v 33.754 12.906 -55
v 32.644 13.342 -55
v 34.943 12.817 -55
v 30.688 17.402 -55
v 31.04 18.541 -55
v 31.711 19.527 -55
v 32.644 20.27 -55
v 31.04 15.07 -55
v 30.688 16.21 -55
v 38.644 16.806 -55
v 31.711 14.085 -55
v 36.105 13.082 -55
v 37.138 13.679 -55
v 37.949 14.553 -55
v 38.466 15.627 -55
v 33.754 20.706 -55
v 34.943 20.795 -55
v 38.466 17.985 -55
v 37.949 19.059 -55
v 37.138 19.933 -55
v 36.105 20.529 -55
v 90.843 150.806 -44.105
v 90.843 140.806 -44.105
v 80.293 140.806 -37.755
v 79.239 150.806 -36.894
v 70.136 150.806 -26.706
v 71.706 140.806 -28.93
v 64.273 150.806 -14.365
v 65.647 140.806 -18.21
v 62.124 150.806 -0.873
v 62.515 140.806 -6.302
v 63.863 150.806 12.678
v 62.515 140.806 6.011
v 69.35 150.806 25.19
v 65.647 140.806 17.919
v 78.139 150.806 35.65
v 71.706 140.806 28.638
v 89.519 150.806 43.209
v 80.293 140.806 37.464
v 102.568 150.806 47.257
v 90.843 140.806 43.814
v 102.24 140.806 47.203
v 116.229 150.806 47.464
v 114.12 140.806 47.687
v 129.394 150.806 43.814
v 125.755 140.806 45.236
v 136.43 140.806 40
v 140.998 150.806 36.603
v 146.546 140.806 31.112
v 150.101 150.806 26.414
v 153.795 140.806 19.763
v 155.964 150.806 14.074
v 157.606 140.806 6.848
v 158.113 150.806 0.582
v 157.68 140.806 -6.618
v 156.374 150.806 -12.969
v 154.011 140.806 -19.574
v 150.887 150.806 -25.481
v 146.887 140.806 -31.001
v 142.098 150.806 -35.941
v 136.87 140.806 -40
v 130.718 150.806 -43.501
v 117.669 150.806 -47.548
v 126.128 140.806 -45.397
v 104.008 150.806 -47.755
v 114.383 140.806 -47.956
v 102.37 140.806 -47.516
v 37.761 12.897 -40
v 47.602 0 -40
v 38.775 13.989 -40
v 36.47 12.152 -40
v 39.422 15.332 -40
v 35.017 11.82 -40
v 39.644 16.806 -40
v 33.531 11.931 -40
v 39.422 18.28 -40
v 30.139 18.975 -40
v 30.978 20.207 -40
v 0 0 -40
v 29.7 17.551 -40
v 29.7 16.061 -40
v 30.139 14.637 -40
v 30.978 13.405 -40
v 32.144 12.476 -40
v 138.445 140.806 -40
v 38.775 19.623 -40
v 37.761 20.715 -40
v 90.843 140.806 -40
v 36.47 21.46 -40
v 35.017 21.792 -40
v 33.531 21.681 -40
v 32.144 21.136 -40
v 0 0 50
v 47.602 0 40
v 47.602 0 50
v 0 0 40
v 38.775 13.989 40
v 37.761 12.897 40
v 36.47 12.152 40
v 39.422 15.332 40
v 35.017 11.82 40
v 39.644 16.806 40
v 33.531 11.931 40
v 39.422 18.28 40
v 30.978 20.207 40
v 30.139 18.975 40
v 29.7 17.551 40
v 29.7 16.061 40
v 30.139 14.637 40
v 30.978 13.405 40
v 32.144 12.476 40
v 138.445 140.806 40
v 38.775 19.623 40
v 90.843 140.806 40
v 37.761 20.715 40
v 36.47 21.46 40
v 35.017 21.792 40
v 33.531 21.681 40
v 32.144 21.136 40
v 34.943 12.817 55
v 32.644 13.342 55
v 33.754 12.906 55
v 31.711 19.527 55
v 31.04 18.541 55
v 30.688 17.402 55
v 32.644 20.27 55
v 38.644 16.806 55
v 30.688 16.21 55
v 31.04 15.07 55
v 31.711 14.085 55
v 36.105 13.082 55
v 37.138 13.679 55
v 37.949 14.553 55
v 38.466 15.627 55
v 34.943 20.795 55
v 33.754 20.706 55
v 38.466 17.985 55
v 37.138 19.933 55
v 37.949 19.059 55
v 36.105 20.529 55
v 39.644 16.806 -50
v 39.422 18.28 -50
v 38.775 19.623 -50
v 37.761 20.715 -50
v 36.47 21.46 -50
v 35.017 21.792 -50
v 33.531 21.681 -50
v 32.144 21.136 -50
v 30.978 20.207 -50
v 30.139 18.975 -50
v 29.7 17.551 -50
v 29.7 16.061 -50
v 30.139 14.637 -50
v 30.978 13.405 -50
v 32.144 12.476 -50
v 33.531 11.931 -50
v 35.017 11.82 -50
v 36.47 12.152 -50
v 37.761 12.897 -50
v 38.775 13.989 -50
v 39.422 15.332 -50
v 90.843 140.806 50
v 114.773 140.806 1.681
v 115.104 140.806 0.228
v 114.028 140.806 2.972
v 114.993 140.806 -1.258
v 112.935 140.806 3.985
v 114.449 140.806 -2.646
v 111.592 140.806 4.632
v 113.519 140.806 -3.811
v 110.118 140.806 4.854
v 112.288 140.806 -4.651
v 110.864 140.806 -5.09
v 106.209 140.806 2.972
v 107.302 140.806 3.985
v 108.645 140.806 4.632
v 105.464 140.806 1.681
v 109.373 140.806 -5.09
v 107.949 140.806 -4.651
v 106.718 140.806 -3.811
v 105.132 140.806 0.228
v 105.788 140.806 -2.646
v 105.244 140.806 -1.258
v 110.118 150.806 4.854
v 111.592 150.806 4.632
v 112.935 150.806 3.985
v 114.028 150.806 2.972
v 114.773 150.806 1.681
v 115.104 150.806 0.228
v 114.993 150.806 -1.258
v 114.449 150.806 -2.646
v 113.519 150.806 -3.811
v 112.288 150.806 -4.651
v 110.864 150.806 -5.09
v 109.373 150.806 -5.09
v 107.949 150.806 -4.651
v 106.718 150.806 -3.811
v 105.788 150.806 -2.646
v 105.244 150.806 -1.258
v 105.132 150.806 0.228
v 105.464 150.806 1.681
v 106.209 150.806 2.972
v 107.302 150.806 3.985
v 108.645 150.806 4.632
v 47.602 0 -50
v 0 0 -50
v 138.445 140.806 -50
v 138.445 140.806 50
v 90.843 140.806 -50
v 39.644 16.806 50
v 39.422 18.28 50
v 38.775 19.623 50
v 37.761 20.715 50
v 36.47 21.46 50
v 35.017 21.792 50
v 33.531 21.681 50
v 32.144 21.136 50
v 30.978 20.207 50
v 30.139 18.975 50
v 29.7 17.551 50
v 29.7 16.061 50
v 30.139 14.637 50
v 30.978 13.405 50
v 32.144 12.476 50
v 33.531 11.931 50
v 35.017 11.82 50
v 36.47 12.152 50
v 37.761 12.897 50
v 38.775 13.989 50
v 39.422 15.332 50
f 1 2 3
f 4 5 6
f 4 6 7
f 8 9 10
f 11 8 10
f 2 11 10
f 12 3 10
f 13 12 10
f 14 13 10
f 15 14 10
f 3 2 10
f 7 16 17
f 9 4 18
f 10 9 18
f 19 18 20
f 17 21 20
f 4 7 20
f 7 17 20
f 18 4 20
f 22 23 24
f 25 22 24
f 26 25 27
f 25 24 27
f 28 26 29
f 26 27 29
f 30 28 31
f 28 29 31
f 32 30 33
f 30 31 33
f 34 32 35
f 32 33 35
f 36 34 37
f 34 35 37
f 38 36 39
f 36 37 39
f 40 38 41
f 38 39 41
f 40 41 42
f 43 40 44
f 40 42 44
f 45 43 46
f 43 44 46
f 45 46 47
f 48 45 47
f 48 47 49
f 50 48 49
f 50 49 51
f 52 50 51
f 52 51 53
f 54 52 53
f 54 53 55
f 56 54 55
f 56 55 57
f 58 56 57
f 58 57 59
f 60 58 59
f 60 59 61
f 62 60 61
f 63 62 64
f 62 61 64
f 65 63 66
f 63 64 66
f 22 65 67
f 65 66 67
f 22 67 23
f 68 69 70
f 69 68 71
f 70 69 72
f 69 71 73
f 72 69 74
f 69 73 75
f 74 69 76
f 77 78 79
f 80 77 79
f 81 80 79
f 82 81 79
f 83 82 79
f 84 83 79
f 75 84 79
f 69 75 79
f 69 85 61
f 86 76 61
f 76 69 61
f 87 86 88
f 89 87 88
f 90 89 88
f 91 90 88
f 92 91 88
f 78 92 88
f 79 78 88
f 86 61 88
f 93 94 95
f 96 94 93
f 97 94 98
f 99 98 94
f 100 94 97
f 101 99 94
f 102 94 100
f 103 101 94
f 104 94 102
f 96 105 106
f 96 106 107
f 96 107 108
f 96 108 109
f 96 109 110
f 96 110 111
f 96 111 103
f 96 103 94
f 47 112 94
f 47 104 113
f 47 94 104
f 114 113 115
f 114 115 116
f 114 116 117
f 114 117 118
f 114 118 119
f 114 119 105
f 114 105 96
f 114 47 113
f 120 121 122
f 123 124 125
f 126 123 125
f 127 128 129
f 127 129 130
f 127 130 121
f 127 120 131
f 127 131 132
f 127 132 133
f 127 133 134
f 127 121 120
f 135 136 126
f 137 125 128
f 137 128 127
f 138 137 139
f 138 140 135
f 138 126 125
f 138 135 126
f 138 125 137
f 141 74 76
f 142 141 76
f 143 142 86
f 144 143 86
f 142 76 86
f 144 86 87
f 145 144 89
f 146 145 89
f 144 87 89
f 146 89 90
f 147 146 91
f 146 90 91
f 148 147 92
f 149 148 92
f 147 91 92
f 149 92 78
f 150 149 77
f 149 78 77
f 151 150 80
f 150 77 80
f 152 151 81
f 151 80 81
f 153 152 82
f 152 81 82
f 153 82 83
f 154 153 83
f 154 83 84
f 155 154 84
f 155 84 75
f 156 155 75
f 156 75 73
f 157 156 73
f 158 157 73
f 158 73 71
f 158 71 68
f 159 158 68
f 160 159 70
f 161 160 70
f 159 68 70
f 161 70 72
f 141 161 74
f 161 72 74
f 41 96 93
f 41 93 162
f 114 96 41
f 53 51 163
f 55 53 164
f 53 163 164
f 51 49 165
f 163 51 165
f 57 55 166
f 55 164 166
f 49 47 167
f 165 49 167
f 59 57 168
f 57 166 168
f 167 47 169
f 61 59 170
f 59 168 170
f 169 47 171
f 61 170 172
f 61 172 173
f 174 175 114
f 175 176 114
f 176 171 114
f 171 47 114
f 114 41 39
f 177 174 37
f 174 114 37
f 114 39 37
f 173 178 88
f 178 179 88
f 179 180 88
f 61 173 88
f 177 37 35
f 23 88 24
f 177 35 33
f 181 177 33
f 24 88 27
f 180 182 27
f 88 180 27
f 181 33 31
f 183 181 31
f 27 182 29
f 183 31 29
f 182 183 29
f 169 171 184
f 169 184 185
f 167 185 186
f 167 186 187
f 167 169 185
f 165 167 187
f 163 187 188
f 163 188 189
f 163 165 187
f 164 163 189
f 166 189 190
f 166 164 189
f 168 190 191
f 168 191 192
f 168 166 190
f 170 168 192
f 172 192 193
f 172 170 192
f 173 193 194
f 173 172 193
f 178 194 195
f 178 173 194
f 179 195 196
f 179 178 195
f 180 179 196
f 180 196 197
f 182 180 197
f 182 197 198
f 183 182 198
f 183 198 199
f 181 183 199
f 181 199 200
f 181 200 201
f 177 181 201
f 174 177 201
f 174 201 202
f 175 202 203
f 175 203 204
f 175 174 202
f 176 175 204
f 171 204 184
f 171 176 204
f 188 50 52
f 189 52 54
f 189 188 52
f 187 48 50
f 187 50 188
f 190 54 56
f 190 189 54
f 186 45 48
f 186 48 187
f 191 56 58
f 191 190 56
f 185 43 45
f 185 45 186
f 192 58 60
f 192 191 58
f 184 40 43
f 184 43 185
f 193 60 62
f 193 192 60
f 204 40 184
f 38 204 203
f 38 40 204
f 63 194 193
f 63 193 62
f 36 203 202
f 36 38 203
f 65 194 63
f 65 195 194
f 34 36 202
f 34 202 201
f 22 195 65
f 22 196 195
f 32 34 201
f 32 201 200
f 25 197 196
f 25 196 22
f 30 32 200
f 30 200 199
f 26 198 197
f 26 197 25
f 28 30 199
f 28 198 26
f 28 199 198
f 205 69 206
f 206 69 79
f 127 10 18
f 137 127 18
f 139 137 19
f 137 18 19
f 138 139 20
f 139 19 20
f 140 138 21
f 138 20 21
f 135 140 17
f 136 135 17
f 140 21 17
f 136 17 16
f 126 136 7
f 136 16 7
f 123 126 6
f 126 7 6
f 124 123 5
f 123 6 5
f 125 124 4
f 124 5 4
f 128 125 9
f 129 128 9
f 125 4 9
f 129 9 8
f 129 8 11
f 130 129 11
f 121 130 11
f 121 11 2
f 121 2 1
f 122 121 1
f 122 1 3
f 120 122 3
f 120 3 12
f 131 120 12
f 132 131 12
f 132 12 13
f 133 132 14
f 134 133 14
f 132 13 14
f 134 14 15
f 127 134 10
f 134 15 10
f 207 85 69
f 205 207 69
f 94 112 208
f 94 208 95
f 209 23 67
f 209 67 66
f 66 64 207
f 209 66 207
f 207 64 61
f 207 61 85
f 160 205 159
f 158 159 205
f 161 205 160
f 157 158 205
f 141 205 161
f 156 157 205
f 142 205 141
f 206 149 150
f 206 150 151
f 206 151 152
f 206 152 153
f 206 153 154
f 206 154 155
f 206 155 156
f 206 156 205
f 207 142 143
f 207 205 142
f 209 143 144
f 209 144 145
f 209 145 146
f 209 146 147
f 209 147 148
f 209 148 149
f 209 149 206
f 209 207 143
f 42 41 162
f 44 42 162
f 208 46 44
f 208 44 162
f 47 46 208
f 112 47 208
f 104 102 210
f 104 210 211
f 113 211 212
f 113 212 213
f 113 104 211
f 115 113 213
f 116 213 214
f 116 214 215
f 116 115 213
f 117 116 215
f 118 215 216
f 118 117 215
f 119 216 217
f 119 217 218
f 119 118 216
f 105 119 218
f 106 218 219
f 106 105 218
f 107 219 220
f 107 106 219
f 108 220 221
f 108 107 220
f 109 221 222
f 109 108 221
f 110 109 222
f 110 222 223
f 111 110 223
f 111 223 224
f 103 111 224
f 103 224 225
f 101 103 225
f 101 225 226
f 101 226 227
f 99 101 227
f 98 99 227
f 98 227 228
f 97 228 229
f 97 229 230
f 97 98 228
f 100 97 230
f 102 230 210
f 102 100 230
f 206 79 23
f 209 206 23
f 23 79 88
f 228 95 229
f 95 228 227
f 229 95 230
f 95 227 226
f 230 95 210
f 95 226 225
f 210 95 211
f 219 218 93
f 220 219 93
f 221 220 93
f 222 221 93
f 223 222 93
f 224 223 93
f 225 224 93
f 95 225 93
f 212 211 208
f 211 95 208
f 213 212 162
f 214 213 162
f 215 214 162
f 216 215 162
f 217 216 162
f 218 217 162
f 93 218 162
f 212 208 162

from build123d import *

# Parameters (mm, degrees)
BOSS_EXTRUDE1_START      = 40
SKETCH1_R                = 5
BOSS_EXTRUDE1_DEPTH      = 10
SKETCH2_R                = 48
SKETCH2_R_2              = 5
BOSS_EXTRUDE2_DEPTH      = 10
BOSS_EXTRUDE3_DEPTH      = 5
BOSS_EXTRUDE3_DEPTH_BACK = 105
SKETCH3_R                = 4


with BuildPart() as part:
    # Sketch1 → Boss-Extrude1 (new body)
    with BuildSketch(Plane.XY.offset(BOSS_EXTRUDE1_START)):
        Polygon((0, 0), (90.842537396, 140.805932964), (138.44477416, 140.805932964), (47.602236763, 0), align=None)
        with Locations((34.643655778, 16.805932964)):
            Circle(SKETCH1_R, mode=Mode.SUBTRACT)
    extrude(amount=BOSS_EXTRUDE1_DEPTH)


with BuildPart() as body_2:
    # Mirror2: mirrored copy
    add(part.part.mirror(Plane.XY))


with BuildPart() as part_1:
    add(part.part)

    add(body_2.part)  # Boss-Extrude2 merges body 2
    # Sketch2 → Boss-Extrude2 (add)
    with BuildSketch(Plane(origin=(0, 140.805932964, 0), x_dir=(1, 0, 0), z_dir=(0, 1, 0))):
        with Locations(Location((110.118373537, 0.145746877, 0), (0, 0, 113.6769841))):
            Circle(SKETCH2_R)
        with Locations(Location((110.118373537, 0.145746877, 0), (0, 0, 270))):
            Circle(SKETCH2_R_2, mode=Mode.SUBTRACT)
    extrude(amount=BOSS_EXTRUDE2_DEPTH)


with BuildPart() as body_2_2:
    # Sketch3 → Boss-Extrude3 (new, two sides: drawn at the far end of the back side and taken through both)
    with BuildSketch(Plane.XY.offset(50).offset(-BOSS_EXTRUDE3_DEPTH_BACK)):
        with Locations((34.643655778, 16.805932964)):
            Circle(SKETCH3_R)
    extrude(amount=BOSS_EXTRUDE3_DEPTH + BOSS_EXTRUDE3_DEPTH_BACK)


solid = Compound([part_1.part, body_2_2.part])
